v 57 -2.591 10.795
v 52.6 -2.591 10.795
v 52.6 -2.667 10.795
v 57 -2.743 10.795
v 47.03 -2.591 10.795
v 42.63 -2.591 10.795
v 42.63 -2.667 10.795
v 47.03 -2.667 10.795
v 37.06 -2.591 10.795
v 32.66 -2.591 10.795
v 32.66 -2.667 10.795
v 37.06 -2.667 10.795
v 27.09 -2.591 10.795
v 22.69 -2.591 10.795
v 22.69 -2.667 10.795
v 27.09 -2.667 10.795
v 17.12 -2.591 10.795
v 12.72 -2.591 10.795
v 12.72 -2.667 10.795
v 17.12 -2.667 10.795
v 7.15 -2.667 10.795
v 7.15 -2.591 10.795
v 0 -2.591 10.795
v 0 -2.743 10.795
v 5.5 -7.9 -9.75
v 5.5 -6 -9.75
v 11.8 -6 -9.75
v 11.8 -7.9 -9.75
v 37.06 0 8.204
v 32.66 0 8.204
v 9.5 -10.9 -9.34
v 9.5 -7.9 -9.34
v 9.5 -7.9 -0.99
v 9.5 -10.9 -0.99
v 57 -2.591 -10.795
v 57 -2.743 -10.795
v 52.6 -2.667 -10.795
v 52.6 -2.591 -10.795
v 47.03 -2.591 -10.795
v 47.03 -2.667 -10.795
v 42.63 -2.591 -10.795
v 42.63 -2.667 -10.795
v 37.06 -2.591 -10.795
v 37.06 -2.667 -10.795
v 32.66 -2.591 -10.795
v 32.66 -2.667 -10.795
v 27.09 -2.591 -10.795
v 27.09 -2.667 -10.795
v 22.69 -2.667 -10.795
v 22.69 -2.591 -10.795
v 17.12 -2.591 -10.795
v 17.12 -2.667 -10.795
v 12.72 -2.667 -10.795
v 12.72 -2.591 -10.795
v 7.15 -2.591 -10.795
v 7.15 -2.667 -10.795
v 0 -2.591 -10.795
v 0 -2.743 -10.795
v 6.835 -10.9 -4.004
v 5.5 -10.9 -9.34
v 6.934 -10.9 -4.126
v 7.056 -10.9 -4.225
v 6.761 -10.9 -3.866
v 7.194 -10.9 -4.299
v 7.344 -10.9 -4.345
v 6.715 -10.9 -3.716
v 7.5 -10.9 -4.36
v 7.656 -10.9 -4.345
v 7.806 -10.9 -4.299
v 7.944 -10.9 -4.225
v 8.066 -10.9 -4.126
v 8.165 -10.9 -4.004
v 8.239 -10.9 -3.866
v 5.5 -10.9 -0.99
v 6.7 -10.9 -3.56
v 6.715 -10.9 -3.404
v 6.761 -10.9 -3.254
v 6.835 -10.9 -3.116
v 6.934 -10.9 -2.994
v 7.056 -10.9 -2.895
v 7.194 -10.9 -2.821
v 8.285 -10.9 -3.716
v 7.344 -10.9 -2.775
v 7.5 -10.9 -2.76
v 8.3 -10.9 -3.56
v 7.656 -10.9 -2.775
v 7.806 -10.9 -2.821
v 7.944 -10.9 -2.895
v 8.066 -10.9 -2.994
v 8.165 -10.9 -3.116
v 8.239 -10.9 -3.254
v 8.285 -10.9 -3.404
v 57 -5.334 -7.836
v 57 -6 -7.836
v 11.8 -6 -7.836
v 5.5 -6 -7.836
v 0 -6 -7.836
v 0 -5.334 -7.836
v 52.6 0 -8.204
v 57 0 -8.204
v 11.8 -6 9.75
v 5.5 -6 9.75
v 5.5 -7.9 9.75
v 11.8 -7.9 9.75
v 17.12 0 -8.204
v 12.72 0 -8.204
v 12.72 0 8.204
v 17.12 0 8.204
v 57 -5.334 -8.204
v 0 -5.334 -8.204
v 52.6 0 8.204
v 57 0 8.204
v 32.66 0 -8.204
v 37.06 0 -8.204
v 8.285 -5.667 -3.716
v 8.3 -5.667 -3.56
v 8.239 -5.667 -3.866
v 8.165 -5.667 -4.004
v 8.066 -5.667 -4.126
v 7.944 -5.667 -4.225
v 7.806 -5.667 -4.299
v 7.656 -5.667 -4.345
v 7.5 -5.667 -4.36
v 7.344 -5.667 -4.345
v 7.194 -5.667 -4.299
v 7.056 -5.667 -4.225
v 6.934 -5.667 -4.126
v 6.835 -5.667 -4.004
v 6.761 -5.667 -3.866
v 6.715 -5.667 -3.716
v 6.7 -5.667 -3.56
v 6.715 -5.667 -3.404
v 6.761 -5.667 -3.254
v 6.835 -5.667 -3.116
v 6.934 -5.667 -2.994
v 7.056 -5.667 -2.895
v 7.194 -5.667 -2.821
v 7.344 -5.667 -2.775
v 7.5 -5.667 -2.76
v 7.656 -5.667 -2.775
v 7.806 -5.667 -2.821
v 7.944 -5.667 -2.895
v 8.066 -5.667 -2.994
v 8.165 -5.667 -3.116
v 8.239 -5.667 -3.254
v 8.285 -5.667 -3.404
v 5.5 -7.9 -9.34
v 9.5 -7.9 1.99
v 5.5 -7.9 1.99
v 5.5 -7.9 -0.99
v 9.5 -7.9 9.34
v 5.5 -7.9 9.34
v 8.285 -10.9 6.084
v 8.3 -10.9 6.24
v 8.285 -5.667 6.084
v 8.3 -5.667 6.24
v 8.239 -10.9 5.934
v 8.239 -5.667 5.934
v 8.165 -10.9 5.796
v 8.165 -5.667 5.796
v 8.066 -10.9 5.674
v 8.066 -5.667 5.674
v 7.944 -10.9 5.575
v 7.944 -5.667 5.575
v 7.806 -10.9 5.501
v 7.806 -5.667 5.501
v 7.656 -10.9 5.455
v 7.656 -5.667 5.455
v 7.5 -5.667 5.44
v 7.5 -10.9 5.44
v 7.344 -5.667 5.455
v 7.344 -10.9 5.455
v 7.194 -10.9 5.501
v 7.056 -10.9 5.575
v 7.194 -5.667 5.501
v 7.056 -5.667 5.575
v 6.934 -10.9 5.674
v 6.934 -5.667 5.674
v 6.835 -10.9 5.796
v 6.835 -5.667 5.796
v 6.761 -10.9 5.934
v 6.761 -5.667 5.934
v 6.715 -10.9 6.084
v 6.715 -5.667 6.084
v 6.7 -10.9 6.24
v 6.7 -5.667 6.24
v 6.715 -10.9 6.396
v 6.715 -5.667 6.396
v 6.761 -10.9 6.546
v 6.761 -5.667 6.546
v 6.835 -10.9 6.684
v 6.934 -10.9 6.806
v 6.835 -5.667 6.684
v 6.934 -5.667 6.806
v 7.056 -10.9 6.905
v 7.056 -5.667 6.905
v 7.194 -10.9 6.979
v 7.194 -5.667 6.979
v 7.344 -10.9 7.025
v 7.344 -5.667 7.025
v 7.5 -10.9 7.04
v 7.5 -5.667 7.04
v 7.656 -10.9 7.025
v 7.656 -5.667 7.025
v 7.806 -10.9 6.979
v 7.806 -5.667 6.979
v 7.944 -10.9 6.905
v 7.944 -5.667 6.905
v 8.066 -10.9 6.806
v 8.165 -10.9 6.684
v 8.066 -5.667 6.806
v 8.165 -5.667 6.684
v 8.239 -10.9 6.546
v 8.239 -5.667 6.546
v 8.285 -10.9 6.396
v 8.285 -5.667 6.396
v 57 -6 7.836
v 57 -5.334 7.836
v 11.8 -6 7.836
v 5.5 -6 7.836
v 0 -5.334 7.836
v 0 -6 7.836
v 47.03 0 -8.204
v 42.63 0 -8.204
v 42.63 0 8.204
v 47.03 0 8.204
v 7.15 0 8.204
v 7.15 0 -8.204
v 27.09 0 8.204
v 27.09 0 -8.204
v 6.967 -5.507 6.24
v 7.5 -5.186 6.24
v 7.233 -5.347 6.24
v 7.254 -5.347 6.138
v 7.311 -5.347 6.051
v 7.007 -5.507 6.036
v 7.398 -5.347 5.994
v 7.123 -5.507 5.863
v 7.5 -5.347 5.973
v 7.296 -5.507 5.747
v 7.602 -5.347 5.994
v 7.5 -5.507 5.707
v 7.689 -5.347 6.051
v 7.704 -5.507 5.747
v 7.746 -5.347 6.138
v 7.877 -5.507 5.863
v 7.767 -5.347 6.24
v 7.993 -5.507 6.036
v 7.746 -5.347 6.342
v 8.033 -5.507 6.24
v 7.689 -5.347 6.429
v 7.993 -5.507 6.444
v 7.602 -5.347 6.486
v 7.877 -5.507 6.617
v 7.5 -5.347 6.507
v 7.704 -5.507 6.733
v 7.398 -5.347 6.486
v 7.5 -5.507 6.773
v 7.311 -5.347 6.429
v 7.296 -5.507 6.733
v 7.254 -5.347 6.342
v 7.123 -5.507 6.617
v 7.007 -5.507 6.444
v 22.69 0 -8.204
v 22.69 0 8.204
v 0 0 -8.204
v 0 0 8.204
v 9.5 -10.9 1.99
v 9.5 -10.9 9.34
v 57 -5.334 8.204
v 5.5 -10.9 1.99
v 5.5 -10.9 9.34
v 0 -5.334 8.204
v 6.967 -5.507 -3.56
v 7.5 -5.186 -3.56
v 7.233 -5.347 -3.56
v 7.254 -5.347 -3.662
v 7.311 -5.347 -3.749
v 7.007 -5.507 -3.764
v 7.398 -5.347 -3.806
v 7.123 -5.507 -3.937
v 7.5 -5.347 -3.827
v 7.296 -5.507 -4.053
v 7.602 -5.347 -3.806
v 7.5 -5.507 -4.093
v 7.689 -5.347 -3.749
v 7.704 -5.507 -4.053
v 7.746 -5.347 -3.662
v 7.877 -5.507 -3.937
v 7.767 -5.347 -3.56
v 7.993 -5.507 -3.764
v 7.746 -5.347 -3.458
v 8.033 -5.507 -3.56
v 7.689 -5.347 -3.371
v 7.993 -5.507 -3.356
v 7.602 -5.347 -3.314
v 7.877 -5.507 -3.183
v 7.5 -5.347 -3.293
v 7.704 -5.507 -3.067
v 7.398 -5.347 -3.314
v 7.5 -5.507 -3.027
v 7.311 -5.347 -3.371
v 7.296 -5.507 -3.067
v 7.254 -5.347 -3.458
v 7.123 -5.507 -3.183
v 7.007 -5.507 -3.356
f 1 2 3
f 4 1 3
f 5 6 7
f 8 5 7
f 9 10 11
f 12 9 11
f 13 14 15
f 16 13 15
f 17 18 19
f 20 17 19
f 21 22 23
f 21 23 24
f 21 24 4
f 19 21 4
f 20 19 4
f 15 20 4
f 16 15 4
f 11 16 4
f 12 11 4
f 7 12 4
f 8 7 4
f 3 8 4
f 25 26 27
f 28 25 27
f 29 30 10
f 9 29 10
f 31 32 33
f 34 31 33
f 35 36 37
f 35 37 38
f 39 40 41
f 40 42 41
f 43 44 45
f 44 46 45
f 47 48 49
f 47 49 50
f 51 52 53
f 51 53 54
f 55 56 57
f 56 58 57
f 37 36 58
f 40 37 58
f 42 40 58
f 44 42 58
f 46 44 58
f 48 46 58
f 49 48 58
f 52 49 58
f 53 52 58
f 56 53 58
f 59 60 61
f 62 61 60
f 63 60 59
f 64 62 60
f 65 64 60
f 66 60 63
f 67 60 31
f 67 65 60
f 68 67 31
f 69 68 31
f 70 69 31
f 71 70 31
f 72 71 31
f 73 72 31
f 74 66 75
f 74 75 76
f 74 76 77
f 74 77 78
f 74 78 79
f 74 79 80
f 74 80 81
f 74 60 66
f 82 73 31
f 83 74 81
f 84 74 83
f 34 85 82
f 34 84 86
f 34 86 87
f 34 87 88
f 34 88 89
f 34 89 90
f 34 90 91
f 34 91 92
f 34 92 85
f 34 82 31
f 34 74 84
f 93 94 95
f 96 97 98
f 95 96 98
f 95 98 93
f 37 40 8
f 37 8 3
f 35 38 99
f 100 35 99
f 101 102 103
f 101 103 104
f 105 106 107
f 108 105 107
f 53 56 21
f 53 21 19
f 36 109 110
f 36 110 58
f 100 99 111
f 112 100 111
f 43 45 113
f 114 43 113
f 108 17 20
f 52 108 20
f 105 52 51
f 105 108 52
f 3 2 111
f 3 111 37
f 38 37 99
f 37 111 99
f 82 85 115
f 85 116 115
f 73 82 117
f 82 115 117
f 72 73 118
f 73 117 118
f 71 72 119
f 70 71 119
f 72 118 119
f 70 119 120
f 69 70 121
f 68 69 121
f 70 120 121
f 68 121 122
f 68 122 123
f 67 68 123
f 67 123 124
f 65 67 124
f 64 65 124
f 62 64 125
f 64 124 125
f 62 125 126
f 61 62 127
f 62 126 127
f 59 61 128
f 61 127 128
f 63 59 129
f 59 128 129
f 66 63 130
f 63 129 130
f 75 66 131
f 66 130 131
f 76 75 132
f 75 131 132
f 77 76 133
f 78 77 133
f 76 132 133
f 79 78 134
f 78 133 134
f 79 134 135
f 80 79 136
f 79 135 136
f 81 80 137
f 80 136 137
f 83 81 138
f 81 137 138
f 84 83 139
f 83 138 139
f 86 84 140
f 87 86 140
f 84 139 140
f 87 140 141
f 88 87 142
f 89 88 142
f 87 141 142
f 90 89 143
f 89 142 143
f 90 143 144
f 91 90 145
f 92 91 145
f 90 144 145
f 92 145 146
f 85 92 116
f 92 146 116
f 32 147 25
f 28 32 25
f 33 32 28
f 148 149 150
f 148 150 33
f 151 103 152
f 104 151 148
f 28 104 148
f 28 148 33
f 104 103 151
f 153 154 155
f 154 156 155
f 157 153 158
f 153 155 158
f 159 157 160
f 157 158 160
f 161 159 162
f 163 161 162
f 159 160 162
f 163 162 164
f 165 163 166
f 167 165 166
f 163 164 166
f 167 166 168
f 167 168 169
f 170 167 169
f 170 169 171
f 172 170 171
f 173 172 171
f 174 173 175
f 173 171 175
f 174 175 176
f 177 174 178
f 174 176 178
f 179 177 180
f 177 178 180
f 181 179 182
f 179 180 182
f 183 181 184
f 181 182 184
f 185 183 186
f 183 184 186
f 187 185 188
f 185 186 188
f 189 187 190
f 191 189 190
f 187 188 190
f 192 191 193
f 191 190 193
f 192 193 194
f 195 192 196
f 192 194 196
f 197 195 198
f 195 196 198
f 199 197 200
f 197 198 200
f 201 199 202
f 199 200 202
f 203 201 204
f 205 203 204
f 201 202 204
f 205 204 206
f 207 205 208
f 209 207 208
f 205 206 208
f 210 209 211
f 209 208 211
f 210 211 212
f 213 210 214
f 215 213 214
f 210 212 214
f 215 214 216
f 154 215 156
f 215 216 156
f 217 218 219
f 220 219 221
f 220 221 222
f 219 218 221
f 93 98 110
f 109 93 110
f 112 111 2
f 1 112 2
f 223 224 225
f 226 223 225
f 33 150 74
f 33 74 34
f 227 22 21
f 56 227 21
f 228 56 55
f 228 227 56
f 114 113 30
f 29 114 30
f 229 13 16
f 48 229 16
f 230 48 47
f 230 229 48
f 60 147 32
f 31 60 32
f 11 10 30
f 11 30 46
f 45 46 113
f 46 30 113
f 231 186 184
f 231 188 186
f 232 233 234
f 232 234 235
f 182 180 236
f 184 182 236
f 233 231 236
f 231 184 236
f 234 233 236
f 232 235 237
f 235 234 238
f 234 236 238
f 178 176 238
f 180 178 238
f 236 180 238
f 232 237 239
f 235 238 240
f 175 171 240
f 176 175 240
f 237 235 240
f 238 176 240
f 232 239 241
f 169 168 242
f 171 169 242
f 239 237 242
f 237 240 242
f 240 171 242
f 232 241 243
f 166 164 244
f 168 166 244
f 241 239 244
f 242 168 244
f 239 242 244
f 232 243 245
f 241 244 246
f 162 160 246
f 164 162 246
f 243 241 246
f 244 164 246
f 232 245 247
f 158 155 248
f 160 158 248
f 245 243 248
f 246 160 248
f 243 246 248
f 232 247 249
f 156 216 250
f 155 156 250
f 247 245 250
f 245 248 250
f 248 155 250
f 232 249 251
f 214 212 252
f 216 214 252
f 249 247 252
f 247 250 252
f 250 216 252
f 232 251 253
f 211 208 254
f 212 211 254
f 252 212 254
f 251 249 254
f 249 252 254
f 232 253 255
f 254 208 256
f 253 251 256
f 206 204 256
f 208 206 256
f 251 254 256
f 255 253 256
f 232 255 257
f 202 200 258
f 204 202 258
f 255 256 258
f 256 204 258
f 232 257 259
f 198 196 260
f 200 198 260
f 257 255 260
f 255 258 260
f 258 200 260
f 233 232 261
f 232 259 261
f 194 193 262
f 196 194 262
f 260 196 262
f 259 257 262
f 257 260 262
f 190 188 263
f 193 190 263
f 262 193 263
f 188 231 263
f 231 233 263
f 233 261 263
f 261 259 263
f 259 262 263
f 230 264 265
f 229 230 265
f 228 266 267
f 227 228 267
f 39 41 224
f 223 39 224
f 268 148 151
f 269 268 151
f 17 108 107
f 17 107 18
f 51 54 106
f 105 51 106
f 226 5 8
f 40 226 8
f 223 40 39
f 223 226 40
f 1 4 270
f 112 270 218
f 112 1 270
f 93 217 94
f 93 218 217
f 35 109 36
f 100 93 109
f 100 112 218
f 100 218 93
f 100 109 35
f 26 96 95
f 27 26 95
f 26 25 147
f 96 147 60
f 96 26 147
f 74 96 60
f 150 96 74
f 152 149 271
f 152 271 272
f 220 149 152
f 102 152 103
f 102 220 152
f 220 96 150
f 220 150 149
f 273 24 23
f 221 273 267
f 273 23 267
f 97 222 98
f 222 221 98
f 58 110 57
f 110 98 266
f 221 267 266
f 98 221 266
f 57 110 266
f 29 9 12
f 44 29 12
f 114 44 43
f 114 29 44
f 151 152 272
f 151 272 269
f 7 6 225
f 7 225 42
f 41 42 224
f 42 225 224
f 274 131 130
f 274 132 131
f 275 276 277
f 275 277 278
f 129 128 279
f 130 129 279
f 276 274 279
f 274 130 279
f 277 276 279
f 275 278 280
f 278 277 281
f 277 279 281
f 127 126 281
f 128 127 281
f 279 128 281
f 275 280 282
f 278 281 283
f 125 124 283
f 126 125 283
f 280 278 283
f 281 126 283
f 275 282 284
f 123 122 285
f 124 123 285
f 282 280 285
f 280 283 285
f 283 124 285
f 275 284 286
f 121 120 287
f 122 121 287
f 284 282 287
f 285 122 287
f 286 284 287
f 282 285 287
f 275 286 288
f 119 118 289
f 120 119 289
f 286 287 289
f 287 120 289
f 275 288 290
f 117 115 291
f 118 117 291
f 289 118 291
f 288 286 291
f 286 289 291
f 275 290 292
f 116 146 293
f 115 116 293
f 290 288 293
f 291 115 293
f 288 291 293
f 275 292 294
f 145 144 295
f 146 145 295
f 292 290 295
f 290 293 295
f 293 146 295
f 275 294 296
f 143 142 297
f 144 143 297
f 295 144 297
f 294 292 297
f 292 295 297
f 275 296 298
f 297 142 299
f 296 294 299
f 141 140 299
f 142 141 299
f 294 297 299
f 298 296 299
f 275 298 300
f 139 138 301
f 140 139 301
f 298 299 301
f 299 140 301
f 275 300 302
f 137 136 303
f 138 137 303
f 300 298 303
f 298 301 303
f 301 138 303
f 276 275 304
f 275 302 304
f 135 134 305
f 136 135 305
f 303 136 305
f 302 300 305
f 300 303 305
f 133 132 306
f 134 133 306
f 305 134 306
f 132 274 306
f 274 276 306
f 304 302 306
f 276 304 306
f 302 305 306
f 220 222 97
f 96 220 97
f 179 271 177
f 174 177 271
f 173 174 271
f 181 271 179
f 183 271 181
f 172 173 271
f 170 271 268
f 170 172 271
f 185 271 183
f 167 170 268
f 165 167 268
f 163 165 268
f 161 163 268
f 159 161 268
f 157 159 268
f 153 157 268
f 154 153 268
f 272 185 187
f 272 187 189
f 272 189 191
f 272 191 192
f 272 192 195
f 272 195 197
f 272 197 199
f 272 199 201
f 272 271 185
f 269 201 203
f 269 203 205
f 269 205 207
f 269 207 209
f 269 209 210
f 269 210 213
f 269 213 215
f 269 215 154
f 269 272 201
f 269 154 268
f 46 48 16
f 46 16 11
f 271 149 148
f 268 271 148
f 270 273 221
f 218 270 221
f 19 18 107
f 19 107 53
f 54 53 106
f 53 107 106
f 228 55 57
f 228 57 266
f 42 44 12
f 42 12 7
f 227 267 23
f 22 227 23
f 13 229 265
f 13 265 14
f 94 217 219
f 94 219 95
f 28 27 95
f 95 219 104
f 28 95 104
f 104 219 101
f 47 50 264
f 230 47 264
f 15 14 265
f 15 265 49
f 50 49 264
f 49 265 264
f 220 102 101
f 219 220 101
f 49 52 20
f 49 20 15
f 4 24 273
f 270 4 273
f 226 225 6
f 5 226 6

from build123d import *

# Parameters (mm, degrees)
BOSS_EXTRUDE1_DEPTH             = 57
SKETCH2_W                       = 5.57
SKETCH2_H                       = 21.59
CUT_EXTRUDE1_DEPTH              = 2.667
LPATTERN1_COUNT                 = 5
LPATTERN1_PITCH                 = 9.97
SKETCH4_W                       = 6.3
SKETCH4_H                       = 19.5
BOSS_EXTRUDE3_DEPTH             = 1.9
SKETCH3_W                       = 4
SKETCH3_H                       = 8.35
SKETCH3_H_2                     = 7.35
BOSS_EXTRUDE2_DEPTH             = 3
TAP_DRILL_FOR_M2X0_4_TAP1_D     = 1.6
TAP_DRILL_FOR_M2X0_4_TAP1_DEPTH = 5.233
TAP_DRILL_FOR_M2X0_4_TAP1_TIP   = 0.480688495


with BuildPart() as part:
    # Sketch1 → Boss-Extrude1 (new body)
    with BuildSketch(Plane(origin=(0, 0, 0), x_dir=(0, 0, -1), z_dir=(1, 0, 0))):
        Polygon((-7.8359, -6), (7.8359, -6), (7.8359, -5.334), (8.2042, -5.334), (10.795, -2.7432), (10.795, -2.5908), (8.2042, 0), (-8.2042, 0), (-10.795, -2.5908), (-10.795, -2.7432), (-8.2042, -5.334), (-7.8359, -5.334), align=None)
    extrude(amount=BOSS_EXTRUDE1_DEPTH)

    # Sketch2 → Cut-Extrude1 (cut)
    with BuildSketch(Plane(origin=(0, 0, 0), x_dir=(1, 0, 0), z_dir=(0, 1, 0))):
        with Locations((49.815, 0)):
            Rectangle(SKETCH2_W, SKETCH2_H)
    cut_extrude1 = extrude(amount=-CUT_EXTRUDE1_DEPTH, mode=Mode.SUBTRACT)

    # LPattern1: Cut-Extrude1 ×5
    with Locations(*[(-i * LPATTERN1_PITCH, 0, 0) for i in range(1, LPATTERN1_COUNT)]):
        add(cut_extrude1, mode=Mode.SUBTRACT)

    # Sketch4 → Boss-Extrude3 (add)
    with BuildSketch(Plane.XZ.offset(6)):
        with Locations((8.65, 0)):
            Rectangle(SKETCH4_W, SKETCH4_H)
    extrude(amount=BOSS_EXTRUDE3_DEPTH)

    # Sketch3 → Boss-Extrude2 (add)
    with BuildSketch(Plane.XZ.offset(7.9)):
        with Locations((7.5, -5.165)):
            Rectangle(SKETCH3_W, SKETCH3_H)
        with Locations((7.5, 5.665)):
            Rectangle(SKETCH3_W, SKETCH3_H_2)
    extrude(amount=BOSS_EXTRUDE2_DEPTH)

    # Tap Drill for M2x0.4 Tap1
    with Locations(Plane(origin=(0, -10.9, 0), x_dir=(-1, 0, 0), z_dir=(0, -1, 0))):
        with Locations((-7.5, -6.24), (-7.5, 3.56)):
            Hole(TAP_DRILL_FOR_M2X0_4_TAP1_D / 2, depth=TAP_DRILL_FOR_M2X0_4_TAP1_DEPTH)
            with Locations((0, 0, -(TAP_DRILL_FOR_M2X0_4_TAP1_DEPTH + TAP_DRILL_FOR_M2X0_4_TAP1_TIP / 2))):  # 118° drill point
                Cone(0, TAP_DRILL_FOR_M2X0_4_TAP1_D / 2, TAP_DRILL_FOR_M2X0_4_TAP1_TIP, mode=Mode.SUBTRACT)


solid = part.part
